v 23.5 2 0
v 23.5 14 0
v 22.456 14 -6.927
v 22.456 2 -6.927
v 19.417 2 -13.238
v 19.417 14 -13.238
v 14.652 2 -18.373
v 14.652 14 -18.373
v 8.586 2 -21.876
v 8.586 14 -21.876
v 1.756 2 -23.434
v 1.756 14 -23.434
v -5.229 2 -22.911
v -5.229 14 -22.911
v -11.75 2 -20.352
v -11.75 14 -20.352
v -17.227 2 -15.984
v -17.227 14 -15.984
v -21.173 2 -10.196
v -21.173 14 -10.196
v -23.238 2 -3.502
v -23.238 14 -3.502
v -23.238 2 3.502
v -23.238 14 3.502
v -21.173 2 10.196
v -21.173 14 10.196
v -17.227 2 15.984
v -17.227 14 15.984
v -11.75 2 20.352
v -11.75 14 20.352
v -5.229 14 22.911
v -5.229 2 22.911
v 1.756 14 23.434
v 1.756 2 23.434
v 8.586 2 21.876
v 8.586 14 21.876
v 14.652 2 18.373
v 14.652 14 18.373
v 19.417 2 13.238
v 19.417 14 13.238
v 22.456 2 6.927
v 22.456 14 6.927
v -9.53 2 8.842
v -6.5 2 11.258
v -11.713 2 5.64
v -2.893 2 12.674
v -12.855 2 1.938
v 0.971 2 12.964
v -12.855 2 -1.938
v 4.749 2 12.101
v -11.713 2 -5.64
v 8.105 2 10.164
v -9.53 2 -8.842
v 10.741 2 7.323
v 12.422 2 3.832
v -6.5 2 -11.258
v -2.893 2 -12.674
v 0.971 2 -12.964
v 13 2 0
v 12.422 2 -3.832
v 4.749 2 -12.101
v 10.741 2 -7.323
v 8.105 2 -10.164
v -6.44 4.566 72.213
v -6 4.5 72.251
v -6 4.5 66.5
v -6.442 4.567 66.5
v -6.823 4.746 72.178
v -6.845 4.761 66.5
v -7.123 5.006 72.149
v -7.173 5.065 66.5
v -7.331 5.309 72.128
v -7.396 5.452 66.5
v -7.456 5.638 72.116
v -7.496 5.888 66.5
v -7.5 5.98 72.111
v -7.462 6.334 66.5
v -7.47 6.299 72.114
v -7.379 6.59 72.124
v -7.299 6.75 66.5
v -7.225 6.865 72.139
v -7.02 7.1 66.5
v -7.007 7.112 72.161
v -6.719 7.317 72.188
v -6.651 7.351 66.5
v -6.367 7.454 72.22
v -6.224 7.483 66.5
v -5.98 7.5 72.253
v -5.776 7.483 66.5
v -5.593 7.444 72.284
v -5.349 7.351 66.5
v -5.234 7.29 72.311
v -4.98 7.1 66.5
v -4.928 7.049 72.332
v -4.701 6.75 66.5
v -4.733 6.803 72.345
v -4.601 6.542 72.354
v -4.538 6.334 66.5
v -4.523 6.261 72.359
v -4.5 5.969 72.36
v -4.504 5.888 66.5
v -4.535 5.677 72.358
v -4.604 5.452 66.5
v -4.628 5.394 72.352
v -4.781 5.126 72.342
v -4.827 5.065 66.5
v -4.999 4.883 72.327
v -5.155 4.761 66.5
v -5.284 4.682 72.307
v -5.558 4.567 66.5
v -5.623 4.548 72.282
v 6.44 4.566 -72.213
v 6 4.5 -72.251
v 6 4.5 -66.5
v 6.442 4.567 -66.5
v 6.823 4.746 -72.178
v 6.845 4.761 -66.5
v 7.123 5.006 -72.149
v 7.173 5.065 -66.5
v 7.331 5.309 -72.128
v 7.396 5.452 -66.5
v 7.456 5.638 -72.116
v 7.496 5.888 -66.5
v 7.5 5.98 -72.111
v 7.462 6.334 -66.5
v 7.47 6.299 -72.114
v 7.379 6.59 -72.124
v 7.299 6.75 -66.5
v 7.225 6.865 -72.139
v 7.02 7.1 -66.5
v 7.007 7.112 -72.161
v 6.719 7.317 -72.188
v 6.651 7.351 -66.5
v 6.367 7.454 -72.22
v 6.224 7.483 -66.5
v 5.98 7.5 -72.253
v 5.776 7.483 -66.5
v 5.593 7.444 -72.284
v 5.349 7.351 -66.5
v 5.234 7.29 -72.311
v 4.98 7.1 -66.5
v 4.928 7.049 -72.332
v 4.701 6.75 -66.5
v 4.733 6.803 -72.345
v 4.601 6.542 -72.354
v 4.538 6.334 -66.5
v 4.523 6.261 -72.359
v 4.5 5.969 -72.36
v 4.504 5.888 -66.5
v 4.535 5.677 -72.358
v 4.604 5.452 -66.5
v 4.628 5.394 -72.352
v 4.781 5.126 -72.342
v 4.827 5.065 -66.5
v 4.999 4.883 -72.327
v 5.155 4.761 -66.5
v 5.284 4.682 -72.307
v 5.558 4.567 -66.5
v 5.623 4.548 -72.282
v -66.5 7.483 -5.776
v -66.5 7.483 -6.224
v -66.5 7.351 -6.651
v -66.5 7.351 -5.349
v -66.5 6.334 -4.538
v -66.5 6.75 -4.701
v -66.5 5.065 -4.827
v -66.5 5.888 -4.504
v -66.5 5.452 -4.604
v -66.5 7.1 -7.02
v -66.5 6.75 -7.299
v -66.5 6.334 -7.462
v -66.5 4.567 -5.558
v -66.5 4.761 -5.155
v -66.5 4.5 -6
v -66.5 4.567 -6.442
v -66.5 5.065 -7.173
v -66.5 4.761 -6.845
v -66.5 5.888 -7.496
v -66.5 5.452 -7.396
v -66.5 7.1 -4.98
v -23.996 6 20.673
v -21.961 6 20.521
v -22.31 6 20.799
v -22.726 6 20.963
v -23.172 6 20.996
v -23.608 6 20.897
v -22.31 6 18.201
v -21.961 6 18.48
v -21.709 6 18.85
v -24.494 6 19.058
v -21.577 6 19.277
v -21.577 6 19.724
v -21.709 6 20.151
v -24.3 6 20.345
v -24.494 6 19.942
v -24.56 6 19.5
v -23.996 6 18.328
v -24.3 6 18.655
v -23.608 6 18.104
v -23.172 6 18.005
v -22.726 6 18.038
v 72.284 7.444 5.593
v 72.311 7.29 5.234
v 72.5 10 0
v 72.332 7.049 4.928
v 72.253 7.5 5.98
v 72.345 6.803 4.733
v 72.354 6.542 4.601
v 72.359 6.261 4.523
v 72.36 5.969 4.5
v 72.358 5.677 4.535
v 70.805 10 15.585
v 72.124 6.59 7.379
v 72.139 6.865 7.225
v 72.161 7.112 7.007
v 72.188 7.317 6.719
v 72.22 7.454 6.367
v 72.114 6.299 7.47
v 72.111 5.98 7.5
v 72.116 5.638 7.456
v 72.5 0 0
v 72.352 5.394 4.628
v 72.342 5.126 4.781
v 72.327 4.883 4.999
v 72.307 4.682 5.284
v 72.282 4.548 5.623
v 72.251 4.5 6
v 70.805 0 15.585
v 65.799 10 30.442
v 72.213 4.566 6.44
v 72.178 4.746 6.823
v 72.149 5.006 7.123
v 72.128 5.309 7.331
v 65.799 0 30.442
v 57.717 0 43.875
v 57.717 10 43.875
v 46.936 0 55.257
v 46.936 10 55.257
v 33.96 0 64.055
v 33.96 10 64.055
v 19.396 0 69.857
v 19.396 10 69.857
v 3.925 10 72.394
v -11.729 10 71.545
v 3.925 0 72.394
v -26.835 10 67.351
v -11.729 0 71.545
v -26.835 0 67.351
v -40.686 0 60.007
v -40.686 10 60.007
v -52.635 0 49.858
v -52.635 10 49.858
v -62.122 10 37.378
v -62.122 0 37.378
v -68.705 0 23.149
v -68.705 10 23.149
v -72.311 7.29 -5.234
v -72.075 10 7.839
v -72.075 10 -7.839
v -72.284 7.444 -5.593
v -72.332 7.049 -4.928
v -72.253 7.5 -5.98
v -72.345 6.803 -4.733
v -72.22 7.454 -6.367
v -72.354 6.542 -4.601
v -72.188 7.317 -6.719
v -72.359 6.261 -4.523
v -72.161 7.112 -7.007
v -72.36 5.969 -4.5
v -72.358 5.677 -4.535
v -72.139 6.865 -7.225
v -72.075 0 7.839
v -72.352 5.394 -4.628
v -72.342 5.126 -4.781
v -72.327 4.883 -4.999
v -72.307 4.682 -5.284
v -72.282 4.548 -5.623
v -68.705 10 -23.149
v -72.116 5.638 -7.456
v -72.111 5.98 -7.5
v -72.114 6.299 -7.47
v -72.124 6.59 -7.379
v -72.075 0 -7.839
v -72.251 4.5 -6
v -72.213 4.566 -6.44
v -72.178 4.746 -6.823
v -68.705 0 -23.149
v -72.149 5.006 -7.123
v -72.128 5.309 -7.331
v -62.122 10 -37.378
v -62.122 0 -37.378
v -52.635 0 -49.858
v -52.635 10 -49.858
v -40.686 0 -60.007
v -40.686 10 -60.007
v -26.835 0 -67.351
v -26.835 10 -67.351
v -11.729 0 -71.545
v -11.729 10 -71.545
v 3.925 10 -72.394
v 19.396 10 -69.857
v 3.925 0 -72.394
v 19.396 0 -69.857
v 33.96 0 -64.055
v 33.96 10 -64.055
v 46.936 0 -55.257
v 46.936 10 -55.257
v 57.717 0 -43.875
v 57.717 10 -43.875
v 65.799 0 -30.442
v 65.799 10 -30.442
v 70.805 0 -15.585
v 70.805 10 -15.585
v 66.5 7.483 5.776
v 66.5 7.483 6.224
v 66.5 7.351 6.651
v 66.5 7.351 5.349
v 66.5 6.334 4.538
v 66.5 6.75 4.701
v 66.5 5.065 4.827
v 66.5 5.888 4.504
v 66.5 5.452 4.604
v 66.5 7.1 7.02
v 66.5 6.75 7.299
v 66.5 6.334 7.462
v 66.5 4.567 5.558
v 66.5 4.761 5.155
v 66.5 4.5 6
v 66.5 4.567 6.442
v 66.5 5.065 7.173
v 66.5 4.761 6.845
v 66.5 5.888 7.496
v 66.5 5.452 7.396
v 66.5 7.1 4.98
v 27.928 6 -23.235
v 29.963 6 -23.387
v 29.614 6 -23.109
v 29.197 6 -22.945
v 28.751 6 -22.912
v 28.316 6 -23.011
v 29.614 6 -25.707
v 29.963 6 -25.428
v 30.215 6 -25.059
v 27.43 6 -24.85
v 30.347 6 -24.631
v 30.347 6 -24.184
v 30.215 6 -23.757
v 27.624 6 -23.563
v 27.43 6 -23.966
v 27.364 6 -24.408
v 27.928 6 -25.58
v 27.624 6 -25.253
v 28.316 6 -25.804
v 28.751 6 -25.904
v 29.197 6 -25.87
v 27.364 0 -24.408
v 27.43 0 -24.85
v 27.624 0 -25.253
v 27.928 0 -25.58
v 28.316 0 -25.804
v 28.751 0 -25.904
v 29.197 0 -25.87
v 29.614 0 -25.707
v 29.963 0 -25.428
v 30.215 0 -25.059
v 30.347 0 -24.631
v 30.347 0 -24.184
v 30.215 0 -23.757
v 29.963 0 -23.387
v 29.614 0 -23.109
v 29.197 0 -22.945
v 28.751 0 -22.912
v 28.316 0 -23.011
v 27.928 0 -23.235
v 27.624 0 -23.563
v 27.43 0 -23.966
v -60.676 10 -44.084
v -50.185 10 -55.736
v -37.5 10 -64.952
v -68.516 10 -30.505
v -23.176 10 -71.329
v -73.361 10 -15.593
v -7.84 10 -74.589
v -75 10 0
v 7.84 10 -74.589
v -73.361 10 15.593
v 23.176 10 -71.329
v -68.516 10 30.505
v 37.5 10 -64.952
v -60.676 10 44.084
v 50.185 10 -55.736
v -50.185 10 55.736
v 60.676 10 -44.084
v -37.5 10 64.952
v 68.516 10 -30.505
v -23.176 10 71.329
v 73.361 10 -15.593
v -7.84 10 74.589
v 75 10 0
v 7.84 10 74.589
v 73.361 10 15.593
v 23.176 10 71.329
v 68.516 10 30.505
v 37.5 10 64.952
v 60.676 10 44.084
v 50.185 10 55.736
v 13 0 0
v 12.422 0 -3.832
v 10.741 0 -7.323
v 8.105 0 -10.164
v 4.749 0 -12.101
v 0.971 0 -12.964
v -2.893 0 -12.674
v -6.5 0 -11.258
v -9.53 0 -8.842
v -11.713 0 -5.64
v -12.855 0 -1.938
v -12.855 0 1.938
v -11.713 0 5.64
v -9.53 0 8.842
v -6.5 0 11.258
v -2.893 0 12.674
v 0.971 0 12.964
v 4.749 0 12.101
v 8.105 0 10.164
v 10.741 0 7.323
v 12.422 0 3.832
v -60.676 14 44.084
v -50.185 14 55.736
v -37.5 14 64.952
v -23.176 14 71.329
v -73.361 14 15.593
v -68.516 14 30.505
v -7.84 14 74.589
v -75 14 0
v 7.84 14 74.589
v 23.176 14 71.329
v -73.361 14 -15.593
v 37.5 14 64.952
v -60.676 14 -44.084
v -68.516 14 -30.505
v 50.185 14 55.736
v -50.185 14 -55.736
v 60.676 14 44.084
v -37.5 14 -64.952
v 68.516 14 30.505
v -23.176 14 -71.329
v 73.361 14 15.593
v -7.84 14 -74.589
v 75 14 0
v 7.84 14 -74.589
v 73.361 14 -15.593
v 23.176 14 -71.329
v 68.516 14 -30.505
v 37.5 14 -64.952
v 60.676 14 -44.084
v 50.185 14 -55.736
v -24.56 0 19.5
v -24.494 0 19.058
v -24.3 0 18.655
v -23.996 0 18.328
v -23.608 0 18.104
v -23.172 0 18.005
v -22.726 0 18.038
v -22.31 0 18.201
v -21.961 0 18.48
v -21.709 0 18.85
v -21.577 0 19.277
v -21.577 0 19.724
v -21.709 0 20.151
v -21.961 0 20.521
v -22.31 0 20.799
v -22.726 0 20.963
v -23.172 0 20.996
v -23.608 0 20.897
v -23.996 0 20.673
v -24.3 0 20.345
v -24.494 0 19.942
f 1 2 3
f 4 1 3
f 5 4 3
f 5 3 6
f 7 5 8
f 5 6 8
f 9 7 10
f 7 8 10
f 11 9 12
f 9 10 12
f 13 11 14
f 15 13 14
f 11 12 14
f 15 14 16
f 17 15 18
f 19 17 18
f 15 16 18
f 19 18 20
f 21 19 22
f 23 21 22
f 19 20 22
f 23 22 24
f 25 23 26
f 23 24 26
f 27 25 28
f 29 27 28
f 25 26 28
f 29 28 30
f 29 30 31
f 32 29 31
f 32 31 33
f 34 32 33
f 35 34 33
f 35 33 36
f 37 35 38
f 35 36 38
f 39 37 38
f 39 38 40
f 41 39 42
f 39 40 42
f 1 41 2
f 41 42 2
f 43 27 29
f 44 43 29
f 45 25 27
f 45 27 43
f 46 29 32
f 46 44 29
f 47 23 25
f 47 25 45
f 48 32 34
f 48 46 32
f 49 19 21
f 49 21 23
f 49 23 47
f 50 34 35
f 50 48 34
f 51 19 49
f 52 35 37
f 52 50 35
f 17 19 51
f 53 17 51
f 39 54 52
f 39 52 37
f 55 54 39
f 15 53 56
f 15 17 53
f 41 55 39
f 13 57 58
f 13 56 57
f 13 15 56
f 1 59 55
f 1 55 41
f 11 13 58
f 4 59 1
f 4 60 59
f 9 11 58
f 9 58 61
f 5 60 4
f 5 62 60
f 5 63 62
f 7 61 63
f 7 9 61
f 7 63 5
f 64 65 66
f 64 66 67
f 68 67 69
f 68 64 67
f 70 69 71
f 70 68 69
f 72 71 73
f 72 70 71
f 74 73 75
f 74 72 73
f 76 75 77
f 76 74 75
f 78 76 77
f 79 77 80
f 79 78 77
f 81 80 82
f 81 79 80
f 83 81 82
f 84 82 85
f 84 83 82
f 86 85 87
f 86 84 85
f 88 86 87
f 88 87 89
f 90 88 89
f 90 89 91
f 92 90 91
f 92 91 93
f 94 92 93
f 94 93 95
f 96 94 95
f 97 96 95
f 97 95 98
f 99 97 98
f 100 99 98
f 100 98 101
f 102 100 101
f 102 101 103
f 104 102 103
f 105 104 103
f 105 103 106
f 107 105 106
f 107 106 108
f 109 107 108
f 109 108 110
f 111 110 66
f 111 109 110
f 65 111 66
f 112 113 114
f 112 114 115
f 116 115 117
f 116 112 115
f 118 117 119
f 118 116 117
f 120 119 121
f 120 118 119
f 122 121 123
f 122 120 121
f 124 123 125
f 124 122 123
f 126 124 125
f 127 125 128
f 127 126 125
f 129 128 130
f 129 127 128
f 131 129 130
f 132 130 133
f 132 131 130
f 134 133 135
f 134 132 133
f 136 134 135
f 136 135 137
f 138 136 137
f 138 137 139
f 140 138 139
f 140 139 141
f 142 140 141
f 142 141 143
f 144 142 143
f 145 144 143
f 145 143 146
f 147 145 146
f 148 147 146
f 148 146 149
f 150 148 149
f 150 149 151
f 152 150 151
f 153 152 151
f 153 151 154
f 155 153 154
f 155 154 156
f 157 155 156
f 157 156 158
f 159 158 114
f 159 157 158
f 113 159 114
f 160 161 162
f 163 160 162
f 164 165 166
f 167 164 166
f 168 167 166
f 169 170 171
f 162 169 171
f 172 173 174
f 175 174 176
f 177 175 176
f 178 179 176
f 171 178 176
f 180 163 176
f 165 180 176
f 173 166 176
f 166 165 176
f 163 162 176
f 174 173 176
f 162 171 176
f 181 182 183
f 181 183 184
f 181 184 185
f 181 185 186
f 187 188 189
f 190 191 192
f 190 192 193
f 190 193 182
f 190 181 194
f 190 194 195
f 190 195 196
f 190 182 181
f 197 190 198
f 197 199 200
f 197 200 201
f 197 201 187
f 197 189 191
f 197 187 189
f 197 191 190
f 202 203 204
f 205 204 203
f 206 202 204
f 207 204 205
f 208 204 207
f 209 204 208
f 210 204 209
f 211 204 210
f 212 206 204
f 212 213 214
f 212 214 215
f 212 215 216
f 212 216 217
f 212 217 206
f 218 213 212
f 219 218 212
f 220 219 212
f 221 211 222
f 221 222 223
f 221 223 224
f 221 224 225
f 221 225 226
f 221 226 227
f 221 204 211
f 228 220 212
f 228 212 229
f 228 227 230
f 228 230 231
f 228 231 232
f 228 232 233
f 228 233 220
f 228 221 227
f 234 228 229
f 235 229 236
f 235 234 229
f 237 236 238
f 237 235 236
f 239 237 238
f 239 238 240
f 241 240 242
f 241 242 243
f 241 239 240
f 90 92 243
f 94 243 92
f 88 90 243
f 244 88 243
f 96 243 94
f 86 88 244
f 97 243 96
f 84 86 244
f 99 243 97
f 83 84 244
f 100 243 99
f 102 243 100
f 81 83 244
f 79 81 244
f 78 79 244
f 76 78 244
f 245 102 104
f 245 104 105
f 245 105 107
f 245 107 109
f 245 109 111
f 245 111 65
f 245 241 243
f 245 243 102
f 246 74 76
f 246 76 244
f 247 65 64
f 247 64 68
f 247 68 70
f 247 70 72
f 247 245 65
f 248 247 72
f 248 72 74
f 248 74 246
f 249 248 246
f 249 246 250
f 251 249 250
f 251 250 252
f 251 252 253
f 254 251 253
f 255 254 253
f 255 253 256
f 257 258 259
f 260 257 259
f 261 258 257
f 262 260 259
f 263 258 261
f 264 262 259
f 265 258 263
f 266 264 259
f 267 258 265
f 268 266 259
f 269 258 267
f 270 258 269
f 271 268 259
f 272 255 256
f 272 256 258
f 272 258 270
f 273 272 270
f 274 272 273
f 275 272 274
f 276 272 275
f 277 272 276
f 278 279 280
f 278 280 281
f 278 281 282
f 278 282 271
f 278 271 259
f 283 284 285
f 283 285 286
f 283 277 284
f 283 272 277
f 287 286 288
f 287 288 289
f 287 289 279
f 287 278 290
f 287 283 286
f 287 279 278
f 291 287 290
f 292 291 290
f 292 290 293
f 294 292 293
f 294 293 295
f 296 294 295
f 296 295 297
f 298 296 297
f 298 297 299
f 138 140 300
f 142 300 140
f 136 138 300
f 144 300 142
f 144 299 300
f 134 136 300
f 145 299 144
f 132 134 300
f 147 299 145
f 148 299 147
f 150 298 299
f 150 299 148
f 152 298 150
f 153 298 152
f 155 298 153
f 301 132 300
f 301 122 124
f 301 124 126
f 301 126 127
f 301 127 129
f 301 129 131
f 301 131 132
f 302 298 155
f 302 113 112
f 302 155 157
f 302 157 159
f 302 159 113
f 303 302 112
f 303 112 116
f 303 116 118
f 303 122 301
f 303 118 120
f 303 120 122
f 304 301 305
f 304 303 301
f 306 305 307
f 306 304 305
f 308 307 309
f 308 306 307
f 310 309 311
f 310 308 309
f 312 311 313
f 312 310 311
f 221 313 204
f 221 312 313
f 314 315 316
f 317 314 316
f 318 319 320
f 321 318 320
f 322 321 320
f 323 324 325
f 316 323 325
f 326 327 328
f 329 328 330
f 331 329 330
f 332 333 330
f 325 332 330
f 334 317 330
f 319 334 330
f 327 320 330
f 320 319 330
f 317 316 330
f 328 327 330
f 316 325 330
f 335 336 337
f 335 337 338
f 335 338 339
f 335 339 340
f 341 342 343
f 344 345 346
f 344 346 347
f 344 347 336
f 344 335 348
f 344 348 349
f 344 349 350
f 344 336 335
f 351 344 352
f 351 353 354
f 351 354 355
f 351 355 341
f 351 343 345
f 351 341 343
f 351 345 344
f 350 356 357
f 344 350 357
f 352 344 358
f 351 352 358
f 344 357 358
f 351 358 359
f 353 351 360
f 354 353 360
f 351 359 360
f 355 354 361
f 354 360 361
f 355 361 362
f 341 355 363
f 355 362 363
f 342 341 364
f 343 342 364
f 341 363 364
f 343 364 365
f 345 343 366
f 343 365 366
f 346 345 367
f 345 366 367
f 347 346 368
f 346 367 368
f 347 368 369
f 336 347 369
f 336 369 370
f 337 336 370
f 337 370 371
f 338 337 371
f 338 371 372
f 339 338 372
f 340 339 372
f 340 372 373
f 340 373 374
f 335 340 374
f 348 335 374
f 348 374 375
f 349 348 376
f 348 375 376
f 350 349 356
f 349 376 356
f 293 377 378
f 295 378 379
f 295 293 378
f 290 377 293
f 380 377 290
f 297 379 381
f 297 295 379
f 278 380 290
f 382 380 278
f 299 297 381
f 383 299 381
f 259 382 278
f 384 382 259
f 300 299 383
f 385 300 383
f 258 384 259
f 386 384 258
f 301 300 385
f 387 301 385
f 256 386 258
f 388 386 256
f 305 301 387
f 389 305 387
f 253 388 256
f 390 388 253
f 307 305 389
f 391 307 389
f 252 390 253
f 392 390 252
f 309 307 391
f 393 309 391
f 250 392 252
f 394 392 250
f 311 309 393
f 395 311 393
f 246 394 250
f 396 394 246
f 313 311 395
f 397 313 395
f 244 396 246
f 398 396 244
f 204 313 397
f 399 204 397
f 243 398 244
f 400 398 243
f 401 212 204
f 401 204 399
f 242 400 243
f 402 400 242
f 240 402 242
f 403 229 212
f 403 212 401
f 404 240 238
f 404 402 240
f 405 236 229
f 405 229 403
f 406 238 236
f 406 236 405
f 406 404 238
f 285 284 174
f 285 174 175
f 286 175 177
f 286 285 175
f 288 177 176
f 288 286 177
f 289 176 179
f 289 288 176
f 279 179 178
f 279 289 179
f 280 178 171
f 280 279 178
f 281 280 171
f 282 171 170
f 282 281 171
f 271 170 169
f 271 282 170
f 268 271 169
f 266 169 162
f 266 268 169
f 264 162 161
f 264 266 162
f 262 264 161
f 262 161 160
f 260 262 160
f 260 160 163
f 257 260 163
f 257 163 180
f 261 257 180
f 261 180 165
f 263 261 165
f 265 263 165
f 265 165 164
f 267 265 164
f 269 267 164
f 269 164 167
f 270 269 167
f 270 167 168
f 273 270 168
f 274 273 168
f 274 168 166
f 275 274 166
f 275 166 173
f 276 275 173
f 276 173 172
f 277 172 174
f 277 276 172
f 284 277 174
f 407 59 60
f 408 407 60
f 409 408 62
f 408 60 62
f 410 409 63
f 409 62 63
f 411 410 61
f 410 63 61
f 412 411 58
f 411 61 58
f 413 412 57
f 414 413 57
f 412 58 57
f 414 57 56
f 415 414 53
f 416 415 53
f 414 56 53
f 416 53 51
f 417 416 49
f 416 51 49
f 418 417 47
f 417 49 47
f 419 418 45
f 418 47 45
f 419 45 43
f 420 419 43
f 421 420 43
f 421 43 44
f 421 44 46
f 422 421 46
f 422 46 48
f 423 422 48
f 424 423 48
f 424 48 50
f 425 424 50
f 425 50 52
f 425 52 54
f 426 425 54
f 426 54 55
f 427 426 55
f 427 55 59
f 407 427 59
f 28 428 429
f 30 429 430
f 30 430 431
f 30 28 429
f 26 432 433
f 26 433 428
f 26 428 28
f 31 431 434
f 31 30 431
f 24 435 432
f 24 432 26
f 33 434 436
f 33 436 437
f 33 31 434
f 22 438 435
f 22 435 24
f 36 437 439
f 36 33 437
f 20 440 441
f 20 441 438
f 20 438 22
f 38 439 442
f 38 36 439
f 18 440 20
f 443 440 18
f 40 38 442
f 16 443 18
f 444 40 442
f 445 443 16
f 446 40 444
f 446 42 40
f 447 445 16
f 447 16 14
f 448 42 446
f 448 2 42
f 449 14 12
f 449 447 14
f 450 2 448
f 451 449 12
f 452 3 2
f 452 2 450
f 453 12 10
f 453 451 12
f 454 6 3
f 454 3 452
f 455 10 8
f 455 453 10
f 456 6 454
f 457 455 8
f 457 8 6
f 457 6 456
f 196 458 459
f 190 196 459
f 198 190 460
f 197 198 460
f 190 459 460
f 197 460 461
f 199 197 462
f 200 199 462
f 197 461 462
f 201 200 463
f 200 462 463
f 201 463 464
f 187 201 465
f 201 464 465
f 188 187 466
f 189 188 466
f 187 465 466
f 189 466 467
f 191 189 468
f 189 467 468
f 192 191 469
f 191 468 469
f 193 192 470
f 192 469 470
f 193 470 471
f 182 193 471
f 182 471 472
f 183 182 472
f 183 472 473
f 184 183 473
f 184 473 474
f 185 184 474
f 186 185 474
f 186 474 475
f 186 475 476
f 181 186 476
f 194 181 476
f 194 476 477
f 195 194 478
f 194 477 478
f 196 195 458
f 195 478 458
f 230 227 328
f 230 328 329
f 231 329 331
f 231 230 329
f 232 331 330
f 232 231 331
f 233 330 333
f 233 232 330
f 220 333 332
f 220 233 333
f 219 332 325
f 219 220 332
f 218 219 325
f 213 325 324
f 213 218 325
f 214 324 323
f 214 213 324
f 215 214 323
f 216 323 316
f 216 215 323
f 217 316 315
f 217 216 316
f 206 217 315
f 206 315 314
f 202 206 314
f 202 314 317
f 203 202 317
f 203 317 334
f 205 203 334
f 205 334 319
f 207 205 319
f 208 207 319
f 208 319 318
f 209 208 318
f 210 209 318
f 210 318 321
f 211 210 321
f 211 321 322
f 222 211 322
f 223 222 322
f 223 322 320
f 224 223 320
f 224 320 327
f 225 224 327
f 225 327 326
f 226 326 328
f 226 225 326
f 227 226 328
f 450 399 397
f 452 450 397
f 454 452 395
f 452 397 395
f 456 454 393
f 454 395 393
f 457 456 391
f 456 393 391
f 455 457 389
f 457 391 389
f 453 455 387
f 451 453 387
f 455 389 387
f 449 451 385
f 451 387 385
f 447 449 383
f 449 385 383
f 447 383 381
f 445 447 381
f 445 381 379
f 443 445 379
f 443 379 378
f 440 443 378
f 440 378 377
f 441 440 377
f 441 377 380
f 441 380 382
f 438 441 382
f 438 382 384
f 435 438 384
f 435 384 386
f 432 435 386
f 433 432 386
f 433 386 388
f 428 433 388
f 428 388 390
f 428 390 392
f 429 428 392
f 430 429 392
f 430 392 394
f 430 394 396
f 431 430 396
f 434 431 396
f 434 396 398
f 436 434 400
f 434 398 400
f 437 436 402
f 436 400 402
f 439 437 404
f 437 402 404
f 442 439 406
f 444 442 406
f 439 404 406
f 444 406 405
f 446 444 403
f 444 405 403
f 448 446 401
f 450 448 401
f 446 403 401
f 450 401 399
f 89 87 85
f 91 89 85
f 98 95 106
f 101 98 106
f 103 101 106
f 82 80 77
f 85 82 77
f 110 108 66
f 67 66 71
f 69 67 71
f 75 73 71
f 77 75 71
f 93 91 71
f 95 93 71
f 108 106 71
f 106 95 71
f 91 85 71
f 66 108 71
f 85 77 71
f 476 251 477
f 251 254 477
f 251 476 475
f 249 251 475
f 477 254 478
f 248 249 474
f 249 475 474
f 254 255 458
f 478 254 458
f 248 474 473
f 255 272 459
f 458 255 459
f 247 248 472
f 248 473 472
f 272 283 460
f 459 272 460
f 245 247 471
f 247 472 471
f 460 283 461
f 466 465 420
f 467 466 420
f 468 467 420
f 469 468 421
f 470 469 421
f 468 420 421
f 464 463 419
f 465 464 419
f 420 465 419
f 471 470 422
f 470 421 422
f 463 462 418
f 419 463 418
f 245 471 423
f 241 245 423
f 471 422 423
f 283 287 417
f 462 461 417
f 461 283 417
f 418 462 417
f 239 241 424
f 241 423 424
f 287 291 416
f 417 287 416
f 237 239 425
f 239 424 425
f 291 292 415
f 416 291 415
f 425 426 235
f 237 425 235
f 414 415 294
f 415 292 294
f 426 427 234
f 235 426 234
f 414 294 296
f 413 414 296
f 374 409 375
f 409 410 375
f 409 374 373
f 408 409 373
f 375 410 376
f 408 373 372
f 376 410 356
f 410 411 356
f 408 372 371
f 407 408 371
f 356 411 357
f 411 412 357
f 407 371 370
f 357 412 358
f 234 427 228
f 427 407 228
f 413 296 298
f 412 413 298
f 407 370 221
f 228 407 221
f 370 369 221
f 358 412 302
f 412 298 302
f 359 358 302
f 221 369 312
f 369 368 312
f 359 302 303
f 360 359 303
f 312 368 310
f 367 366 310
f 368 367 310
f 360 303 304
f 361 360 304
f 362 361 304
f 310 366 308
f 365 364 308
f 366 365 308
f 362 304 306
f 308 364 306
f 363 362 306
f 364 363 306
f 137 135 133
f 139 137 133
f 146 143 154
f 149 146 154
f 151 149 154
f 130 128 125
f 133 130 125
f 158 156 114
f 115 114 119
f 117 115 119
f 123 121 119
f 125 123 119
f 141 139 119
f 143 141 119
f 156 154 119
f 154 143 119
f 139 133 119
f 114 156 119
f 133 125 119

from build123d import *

# Parameters (mm, degrees)
SZKIC4_R                    = 75
DODANIE_WYCI_GNI_CIE2_DEPTH = 14
SZKIC5_R                    = 23.5
WYTNIJ_WYCI_GNI_CIE3_DEPTH  = 12
SZKIC6_R                    = 13
WYTNIJ_WYCI_GNI_CIE4_DEPTH  = 12
SZKIC7_R                    = 75
SZKIC7_R_2                  = 72.5
WYTNIJ_WYCI_GNI_CIE5_DEPTH  = 10
SZKIC8_R                    = 1.5
WYTNIJ_WYCI_GNI_CIE6_DEPTH  = 6
SZKIC10_R                   = 1.5
WYTNIJ_WYCI_GNI_CIE7_DEPTH  = 6
SZYK_KO_OWY1_COUNT          = 4


with BuildPart() as part:
    # Szkic4 → Dodanie-wyciągnięcie2 (new body)
    with BuildSketch(Plane(origin=(0, 0, 0), x_dir=(1, 0, 0), z_dir=(0, 1, 0))):
        Circle(SZKIC4_R)
    extrude(amount=DODANIE_WYCI_GNI_CIE2_DEPTH)

    # Szkic5 → Wytnij-wyciągnięcie3 (cut)
    with BuildSketch(Plane(origin=(0, 14, 0), x_dir=(1, 0, 0), z_dir=(0, 1, 0))):
        Circle(SZKIC5_R)
    extrude(amount=-WYTNIJ_WYCI_GNI_CIE3_DEPTH, mode=Mode.SUBTRACT)

    # Szkic6 → Wytnij-wyciągnięcie4 (cut)
    with BuildSketch(Plane(origin=(0, 2, 0), x_dir=(1, 0, 0), z_dir=(0, 1, 0))):
        Circle(SZKIC6_R)
    extrude(amount=-WYTNIJ_WYCI_GNI_CIE4_DEPTH, mode=Mode.SUBTRACT)

    # Szkic7 → Wytnij-wyciągnięcie5 (cut)
    with BuildSketch(Plane.XZ):
        Circle(SZKIC7_R)
        Circle(SZKIC7_R_2, mode=Mode.SUBTRACT)
    extrude(amount=-WYTNIJ_WYCI_GNI_CIE5_DEPTH, mode=Mode.SUBTRACT)

    # Szkic8 → Wytnij-wyciągnięcie6 (cut)
    with BuildSketch(Plane(origin=(0, 0, 0), x_dir=(-1, 0, 0), z_dir=(0, -1, 0))):
        with Locations((23.060270904, -19.500356556)):
            Circle(SZKIC8_R)
        with Locations((-28.863517887, 24.407731054)):
            Circle(SZKIC8_R)
    extrude(amount=-WYTNIJ_WYCI_GNI_CIE6_DEPTH, mode=Mode.SUBTRACT)

    # Szkic10 → Wytnij-wyciągnięcie7 (cut)
    with BuildSketch(Plane(origin=(0, 0, 72.5), x_dir=(0, -1, 0), z_dir=(0, 0, -1))):
        with Locations((-6, 6)):
            Circle(SZKIC10_R)
    wytnij_wyci_gni_cie7 = extrude(amount=WYTNIJ_WYCI_GNI_CIE7_DEPTH, mode=Mode.SUBTRACT)

    # Szyk kołowy1: Wytnij-wyciągnięcie7 ×4 about axis
    szyk_ko_owy1_axis = Axis((0, 0, 0), (0, 1, 0))
    for i in range(1, SZYK_KO_OWY1_COUNT):
        add(wytnij_wyci_gni_cie7.rotate(szyk_ko_owy1_axis, i * 360 / SZYK_KO_OWY1_COUNT), mode=Mode.SUBTRACT)


solid = part.part
